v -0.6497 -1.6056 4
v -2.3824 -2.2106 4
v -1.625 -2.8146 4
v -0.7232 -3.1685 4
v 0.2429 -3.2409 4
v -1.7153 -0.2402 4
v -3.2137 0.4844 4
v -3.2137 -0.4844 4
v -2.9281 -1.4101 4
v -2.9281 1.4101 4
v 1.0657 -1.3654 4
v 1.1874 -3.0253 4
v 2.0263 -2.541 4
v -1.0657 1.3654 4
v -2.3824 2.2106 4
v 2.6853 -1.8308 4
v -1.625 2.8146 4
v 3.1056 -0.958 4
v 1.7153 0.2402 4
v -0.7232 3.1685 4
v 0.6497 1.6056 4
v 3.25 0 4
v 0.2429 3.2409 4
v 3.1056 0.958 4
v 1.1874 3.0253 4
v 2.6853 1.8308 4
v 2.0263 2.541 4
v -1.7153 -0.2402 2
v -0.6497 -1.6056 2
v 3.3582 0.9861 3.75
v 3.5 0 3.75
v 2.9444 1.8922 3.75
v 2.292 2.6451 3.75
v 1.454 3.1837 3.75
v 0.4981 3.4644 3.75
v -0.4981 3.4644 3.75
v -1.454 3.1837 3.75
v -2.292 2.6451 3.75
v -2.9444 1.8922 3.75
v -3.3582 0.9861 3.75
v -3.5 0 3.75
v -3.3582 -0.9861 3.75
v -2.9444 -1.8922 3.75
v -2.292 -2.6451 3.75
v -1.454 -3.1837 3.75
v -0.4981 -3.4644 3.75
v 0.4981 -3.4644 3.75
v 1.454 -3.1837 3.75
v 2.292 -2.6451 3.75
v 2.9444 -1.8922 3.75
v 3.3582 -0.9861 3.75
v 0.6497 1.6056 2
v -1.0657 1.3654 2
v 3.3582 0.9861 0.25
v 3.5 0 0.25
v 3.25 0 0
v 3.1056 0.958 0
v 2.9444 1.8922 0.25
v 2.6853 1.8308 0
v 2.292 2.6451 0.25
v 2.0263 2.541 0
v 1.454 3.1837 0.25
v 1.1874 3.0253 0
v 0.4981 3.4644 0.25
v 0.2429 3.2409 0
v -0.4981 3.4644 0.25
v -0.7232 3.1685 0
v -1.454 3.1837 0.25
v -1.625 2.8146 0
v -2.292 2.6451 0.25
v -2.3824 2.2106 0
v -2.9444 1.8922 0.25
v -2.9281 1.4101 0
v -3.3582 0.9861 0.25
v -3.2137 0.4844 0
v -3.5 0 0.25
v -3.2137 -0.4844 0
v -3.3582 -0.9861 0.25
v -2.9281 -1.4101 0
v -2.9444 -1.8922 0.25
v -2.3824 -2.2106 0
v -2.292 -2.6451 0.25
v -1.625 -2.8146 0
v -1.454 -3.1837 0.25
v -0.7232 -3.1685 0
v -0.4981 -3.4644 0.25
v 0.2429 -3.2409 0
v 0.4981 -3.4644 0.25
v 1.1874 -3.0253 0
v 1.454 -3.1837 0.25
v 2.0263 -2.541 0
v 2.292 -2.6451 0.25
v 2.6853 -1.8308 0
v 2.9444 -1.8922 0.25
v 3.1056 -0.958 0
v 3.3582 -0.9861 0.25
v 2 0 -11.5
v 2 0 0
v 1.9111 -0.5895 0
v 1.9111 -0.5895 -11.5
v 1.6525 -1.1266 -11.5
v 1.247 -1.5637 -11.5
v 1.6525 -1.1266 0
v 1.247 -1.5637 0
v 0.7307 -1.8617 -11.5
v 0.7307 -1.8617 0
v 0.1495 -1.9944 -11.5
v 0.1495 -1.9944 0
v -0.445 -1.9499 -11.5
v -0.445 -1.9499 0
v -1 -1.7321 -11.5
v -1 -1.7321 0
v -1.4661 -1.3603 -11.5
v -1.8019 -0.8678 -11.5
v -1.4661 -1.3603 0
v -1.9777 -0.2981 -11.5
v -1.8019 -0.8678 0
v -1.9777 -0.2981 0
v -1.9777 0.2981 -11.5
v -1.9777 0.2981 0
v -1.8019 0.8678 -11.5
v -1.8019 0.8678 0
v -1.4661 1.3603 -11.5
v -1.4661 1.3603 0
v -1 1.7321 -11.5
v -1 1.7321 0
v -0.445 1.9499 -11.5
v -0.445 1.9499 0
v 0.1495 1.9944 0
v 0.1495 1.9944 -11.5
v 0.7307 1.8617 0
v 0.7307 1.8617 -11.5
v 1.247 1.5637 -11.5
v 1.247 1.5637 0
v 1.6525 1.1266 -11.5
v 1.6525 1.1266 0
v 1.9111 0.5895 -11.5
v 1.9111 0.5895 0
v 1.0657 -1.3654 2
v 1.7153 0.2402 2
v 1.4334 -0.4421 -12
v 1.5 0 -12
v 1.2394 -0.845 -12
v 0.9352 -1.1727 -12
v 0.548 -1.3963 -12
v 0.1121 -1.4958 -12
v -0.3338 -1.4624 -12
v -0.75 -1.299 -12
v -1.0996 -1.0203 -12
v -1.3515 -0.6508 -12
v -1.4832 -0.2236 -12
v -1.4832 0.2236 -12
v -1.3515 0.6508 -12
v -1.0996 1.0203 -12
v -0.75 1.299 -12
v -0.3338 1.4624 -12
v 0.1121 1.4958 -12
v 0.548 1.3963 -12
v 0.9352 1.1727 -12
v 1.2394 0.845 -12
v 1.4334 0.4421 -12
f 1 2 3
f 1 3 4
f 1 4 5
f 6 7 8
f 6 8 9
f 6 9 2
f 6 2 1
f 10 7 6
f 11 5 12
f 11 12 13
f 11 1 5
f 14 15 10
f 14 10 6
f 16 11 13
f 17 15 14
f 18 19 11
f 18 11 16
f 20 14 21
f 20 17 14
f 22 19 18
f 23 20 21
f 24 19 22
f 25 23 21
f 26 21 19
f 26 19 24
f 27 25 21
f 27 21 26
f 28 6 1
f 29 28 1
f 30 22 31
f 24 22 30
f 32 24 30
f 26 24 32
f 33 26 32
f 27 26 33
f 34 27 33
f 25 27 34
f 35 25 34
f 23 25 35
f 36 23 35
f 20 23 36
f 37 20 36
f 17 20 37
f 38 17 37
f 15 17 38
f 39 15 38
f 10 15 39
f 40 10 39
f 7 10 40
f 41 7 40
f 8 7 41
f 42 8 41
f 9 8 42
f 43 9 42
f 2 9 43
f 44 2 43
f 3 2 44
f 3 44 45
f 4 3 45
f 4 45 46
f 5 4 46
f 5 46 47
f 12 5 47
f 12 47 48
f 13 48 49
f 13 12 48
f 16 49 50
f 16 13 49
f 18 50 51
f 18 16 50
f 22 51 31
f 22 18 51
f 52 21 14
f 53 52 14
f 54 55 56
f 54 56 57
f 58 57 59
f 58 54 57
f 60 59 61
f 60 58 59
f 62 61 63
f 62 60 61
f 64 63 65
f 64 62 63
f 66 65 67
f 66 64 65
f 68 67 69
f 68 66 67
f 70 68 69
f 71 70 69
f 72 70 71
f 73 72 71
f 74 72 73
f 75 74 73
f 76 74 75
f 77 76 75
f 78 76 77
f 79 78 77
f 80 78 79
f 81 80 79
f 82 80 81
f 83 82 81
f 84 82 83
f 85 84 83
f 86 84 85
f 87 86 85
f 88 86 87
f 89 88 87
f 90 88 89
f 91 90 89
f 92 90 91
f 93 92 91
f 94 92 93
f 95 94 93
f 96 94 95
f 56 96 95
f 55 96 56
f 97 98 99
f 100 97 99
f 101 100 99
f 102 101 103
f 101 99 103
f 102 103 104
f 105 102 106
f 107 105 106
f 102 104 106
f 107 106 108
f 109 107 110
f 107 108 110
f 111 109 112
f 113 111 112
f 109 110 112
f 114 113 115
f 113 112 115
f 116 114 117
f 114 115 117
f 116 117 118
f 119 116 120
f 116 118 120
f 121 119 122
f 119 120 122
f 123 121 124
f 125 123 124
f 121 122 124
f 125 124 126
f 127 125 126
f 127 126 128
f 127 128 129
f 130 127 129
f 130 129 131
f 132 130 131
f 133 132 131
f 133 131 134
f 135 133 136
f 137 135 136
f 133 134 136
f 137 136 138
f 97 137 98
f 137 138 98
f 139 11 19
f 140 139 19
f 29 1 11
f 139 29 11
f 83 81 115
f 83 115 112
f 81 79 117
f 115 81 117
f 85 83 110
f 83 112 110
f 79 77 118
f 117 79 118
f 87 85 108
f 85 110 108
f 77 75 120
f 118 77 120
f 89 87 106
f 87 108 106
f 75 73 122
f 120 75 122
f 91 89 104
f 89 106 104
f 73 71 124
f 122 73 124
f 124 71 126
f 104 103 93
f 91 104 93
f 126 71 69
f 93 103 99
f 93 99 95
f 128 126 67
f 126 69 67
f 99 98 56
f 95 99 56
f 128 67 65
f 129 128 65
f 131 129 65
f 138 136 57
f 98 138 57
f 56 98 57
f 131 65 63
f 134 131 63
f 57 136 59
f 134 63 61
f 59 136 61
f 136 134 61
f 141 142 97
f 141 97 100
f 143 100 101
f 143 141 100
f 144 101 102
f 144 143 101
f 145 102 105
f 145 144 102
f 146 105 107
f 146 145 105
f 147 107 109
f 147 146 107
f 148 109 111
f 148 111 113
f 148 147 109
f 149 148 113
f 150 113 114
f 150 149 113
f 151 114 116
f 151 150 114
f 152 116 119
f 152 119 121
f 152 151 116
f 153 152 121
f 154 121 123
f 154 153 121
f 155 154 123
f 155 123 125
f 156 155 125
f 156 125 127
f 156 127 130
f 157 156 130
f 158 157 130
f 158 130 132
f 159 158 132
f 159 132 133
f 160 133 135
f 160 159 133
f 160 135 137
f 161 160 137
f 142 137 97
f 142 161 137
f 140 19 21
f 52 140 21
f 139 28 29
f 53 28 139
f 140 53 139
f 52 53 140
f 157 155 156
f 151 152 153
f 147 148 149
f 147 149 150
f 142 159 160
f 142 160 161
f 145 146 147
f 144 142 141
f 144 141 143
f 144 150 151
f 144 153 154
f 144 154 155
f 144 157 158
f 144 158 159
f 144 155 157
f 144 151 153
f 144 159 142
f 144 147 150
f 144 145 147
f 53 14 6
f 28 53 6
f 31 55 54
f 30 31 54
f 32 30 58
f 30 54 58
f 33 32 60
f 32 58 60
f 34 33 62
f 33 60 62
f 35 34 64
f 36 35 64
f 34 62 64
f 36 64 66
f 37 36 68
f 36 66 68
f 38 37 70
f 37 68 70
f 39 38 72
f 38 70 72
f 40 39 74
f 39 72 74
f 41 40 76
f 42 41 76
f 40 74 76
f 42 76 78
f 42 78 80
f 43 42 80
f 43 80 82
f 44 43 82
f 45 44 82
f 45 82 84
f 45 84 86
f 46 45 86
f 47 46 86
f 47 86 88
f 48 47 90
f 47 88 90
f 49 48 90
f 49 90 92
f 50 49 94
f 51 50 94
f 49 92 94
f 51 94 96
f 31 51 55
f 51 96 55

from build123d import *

# Parameters (mm, degrees)
F0_R     = 3.5
F1_DEPTH = 4
F3_DEPTH = 2
F4_R     = 2
F5_DEPTH = 12
F6_SIZE  = 0.5
F7_SIZE  = 0.25


with BuildPart() as f1:
    # F0 (on Top) → F1 (new body)
    with BuildSketch(Plane.XY):
        Circle(F0_R)
    extrude(amount=F1_DEPTH)

    # F2 (on face) → F3 (cut)
    with BuildSketch(Plane.XY.offset(4)):
        Polygon((1.0656559782, -1.3654220359), (1.7153181591, 0.2401741309), (0.6496621809, 1.6055961668), (-1.0656559782, 1.3654220359), (-1.7153181591, -0.2401741309), (-0.6496621809, -1.6055961668), align=None)
    extrude(amount=-F3_DEPTH, mode=Mode.SUBTRACT)

    # F4 (on face) → F5 (join)
    with BuildSketch(Plane(origin=(0, 0, 0), x_dir=(1, 0, 0), z_dir=(0, 0, -1))):
        Circle(F4_R)
    extrude(amount=F5_DEPTH)

    # F6
    f6_edges = [f1.edges().sort_by_distance(p)[0] for p in [
        (-2, 0, -12),
    ]]
    chamfer(f6_edges, length=F6_SIZE)

    # F7
    f7_edges = [f1.edges().sort_by_distance(p)[0] for p in [
        (-3.5, 0, 0),
        (-3.5, 0, 4),
    ]]
    chamfer(f7_edges, length=F7_SIZE)


solid = f1.part
